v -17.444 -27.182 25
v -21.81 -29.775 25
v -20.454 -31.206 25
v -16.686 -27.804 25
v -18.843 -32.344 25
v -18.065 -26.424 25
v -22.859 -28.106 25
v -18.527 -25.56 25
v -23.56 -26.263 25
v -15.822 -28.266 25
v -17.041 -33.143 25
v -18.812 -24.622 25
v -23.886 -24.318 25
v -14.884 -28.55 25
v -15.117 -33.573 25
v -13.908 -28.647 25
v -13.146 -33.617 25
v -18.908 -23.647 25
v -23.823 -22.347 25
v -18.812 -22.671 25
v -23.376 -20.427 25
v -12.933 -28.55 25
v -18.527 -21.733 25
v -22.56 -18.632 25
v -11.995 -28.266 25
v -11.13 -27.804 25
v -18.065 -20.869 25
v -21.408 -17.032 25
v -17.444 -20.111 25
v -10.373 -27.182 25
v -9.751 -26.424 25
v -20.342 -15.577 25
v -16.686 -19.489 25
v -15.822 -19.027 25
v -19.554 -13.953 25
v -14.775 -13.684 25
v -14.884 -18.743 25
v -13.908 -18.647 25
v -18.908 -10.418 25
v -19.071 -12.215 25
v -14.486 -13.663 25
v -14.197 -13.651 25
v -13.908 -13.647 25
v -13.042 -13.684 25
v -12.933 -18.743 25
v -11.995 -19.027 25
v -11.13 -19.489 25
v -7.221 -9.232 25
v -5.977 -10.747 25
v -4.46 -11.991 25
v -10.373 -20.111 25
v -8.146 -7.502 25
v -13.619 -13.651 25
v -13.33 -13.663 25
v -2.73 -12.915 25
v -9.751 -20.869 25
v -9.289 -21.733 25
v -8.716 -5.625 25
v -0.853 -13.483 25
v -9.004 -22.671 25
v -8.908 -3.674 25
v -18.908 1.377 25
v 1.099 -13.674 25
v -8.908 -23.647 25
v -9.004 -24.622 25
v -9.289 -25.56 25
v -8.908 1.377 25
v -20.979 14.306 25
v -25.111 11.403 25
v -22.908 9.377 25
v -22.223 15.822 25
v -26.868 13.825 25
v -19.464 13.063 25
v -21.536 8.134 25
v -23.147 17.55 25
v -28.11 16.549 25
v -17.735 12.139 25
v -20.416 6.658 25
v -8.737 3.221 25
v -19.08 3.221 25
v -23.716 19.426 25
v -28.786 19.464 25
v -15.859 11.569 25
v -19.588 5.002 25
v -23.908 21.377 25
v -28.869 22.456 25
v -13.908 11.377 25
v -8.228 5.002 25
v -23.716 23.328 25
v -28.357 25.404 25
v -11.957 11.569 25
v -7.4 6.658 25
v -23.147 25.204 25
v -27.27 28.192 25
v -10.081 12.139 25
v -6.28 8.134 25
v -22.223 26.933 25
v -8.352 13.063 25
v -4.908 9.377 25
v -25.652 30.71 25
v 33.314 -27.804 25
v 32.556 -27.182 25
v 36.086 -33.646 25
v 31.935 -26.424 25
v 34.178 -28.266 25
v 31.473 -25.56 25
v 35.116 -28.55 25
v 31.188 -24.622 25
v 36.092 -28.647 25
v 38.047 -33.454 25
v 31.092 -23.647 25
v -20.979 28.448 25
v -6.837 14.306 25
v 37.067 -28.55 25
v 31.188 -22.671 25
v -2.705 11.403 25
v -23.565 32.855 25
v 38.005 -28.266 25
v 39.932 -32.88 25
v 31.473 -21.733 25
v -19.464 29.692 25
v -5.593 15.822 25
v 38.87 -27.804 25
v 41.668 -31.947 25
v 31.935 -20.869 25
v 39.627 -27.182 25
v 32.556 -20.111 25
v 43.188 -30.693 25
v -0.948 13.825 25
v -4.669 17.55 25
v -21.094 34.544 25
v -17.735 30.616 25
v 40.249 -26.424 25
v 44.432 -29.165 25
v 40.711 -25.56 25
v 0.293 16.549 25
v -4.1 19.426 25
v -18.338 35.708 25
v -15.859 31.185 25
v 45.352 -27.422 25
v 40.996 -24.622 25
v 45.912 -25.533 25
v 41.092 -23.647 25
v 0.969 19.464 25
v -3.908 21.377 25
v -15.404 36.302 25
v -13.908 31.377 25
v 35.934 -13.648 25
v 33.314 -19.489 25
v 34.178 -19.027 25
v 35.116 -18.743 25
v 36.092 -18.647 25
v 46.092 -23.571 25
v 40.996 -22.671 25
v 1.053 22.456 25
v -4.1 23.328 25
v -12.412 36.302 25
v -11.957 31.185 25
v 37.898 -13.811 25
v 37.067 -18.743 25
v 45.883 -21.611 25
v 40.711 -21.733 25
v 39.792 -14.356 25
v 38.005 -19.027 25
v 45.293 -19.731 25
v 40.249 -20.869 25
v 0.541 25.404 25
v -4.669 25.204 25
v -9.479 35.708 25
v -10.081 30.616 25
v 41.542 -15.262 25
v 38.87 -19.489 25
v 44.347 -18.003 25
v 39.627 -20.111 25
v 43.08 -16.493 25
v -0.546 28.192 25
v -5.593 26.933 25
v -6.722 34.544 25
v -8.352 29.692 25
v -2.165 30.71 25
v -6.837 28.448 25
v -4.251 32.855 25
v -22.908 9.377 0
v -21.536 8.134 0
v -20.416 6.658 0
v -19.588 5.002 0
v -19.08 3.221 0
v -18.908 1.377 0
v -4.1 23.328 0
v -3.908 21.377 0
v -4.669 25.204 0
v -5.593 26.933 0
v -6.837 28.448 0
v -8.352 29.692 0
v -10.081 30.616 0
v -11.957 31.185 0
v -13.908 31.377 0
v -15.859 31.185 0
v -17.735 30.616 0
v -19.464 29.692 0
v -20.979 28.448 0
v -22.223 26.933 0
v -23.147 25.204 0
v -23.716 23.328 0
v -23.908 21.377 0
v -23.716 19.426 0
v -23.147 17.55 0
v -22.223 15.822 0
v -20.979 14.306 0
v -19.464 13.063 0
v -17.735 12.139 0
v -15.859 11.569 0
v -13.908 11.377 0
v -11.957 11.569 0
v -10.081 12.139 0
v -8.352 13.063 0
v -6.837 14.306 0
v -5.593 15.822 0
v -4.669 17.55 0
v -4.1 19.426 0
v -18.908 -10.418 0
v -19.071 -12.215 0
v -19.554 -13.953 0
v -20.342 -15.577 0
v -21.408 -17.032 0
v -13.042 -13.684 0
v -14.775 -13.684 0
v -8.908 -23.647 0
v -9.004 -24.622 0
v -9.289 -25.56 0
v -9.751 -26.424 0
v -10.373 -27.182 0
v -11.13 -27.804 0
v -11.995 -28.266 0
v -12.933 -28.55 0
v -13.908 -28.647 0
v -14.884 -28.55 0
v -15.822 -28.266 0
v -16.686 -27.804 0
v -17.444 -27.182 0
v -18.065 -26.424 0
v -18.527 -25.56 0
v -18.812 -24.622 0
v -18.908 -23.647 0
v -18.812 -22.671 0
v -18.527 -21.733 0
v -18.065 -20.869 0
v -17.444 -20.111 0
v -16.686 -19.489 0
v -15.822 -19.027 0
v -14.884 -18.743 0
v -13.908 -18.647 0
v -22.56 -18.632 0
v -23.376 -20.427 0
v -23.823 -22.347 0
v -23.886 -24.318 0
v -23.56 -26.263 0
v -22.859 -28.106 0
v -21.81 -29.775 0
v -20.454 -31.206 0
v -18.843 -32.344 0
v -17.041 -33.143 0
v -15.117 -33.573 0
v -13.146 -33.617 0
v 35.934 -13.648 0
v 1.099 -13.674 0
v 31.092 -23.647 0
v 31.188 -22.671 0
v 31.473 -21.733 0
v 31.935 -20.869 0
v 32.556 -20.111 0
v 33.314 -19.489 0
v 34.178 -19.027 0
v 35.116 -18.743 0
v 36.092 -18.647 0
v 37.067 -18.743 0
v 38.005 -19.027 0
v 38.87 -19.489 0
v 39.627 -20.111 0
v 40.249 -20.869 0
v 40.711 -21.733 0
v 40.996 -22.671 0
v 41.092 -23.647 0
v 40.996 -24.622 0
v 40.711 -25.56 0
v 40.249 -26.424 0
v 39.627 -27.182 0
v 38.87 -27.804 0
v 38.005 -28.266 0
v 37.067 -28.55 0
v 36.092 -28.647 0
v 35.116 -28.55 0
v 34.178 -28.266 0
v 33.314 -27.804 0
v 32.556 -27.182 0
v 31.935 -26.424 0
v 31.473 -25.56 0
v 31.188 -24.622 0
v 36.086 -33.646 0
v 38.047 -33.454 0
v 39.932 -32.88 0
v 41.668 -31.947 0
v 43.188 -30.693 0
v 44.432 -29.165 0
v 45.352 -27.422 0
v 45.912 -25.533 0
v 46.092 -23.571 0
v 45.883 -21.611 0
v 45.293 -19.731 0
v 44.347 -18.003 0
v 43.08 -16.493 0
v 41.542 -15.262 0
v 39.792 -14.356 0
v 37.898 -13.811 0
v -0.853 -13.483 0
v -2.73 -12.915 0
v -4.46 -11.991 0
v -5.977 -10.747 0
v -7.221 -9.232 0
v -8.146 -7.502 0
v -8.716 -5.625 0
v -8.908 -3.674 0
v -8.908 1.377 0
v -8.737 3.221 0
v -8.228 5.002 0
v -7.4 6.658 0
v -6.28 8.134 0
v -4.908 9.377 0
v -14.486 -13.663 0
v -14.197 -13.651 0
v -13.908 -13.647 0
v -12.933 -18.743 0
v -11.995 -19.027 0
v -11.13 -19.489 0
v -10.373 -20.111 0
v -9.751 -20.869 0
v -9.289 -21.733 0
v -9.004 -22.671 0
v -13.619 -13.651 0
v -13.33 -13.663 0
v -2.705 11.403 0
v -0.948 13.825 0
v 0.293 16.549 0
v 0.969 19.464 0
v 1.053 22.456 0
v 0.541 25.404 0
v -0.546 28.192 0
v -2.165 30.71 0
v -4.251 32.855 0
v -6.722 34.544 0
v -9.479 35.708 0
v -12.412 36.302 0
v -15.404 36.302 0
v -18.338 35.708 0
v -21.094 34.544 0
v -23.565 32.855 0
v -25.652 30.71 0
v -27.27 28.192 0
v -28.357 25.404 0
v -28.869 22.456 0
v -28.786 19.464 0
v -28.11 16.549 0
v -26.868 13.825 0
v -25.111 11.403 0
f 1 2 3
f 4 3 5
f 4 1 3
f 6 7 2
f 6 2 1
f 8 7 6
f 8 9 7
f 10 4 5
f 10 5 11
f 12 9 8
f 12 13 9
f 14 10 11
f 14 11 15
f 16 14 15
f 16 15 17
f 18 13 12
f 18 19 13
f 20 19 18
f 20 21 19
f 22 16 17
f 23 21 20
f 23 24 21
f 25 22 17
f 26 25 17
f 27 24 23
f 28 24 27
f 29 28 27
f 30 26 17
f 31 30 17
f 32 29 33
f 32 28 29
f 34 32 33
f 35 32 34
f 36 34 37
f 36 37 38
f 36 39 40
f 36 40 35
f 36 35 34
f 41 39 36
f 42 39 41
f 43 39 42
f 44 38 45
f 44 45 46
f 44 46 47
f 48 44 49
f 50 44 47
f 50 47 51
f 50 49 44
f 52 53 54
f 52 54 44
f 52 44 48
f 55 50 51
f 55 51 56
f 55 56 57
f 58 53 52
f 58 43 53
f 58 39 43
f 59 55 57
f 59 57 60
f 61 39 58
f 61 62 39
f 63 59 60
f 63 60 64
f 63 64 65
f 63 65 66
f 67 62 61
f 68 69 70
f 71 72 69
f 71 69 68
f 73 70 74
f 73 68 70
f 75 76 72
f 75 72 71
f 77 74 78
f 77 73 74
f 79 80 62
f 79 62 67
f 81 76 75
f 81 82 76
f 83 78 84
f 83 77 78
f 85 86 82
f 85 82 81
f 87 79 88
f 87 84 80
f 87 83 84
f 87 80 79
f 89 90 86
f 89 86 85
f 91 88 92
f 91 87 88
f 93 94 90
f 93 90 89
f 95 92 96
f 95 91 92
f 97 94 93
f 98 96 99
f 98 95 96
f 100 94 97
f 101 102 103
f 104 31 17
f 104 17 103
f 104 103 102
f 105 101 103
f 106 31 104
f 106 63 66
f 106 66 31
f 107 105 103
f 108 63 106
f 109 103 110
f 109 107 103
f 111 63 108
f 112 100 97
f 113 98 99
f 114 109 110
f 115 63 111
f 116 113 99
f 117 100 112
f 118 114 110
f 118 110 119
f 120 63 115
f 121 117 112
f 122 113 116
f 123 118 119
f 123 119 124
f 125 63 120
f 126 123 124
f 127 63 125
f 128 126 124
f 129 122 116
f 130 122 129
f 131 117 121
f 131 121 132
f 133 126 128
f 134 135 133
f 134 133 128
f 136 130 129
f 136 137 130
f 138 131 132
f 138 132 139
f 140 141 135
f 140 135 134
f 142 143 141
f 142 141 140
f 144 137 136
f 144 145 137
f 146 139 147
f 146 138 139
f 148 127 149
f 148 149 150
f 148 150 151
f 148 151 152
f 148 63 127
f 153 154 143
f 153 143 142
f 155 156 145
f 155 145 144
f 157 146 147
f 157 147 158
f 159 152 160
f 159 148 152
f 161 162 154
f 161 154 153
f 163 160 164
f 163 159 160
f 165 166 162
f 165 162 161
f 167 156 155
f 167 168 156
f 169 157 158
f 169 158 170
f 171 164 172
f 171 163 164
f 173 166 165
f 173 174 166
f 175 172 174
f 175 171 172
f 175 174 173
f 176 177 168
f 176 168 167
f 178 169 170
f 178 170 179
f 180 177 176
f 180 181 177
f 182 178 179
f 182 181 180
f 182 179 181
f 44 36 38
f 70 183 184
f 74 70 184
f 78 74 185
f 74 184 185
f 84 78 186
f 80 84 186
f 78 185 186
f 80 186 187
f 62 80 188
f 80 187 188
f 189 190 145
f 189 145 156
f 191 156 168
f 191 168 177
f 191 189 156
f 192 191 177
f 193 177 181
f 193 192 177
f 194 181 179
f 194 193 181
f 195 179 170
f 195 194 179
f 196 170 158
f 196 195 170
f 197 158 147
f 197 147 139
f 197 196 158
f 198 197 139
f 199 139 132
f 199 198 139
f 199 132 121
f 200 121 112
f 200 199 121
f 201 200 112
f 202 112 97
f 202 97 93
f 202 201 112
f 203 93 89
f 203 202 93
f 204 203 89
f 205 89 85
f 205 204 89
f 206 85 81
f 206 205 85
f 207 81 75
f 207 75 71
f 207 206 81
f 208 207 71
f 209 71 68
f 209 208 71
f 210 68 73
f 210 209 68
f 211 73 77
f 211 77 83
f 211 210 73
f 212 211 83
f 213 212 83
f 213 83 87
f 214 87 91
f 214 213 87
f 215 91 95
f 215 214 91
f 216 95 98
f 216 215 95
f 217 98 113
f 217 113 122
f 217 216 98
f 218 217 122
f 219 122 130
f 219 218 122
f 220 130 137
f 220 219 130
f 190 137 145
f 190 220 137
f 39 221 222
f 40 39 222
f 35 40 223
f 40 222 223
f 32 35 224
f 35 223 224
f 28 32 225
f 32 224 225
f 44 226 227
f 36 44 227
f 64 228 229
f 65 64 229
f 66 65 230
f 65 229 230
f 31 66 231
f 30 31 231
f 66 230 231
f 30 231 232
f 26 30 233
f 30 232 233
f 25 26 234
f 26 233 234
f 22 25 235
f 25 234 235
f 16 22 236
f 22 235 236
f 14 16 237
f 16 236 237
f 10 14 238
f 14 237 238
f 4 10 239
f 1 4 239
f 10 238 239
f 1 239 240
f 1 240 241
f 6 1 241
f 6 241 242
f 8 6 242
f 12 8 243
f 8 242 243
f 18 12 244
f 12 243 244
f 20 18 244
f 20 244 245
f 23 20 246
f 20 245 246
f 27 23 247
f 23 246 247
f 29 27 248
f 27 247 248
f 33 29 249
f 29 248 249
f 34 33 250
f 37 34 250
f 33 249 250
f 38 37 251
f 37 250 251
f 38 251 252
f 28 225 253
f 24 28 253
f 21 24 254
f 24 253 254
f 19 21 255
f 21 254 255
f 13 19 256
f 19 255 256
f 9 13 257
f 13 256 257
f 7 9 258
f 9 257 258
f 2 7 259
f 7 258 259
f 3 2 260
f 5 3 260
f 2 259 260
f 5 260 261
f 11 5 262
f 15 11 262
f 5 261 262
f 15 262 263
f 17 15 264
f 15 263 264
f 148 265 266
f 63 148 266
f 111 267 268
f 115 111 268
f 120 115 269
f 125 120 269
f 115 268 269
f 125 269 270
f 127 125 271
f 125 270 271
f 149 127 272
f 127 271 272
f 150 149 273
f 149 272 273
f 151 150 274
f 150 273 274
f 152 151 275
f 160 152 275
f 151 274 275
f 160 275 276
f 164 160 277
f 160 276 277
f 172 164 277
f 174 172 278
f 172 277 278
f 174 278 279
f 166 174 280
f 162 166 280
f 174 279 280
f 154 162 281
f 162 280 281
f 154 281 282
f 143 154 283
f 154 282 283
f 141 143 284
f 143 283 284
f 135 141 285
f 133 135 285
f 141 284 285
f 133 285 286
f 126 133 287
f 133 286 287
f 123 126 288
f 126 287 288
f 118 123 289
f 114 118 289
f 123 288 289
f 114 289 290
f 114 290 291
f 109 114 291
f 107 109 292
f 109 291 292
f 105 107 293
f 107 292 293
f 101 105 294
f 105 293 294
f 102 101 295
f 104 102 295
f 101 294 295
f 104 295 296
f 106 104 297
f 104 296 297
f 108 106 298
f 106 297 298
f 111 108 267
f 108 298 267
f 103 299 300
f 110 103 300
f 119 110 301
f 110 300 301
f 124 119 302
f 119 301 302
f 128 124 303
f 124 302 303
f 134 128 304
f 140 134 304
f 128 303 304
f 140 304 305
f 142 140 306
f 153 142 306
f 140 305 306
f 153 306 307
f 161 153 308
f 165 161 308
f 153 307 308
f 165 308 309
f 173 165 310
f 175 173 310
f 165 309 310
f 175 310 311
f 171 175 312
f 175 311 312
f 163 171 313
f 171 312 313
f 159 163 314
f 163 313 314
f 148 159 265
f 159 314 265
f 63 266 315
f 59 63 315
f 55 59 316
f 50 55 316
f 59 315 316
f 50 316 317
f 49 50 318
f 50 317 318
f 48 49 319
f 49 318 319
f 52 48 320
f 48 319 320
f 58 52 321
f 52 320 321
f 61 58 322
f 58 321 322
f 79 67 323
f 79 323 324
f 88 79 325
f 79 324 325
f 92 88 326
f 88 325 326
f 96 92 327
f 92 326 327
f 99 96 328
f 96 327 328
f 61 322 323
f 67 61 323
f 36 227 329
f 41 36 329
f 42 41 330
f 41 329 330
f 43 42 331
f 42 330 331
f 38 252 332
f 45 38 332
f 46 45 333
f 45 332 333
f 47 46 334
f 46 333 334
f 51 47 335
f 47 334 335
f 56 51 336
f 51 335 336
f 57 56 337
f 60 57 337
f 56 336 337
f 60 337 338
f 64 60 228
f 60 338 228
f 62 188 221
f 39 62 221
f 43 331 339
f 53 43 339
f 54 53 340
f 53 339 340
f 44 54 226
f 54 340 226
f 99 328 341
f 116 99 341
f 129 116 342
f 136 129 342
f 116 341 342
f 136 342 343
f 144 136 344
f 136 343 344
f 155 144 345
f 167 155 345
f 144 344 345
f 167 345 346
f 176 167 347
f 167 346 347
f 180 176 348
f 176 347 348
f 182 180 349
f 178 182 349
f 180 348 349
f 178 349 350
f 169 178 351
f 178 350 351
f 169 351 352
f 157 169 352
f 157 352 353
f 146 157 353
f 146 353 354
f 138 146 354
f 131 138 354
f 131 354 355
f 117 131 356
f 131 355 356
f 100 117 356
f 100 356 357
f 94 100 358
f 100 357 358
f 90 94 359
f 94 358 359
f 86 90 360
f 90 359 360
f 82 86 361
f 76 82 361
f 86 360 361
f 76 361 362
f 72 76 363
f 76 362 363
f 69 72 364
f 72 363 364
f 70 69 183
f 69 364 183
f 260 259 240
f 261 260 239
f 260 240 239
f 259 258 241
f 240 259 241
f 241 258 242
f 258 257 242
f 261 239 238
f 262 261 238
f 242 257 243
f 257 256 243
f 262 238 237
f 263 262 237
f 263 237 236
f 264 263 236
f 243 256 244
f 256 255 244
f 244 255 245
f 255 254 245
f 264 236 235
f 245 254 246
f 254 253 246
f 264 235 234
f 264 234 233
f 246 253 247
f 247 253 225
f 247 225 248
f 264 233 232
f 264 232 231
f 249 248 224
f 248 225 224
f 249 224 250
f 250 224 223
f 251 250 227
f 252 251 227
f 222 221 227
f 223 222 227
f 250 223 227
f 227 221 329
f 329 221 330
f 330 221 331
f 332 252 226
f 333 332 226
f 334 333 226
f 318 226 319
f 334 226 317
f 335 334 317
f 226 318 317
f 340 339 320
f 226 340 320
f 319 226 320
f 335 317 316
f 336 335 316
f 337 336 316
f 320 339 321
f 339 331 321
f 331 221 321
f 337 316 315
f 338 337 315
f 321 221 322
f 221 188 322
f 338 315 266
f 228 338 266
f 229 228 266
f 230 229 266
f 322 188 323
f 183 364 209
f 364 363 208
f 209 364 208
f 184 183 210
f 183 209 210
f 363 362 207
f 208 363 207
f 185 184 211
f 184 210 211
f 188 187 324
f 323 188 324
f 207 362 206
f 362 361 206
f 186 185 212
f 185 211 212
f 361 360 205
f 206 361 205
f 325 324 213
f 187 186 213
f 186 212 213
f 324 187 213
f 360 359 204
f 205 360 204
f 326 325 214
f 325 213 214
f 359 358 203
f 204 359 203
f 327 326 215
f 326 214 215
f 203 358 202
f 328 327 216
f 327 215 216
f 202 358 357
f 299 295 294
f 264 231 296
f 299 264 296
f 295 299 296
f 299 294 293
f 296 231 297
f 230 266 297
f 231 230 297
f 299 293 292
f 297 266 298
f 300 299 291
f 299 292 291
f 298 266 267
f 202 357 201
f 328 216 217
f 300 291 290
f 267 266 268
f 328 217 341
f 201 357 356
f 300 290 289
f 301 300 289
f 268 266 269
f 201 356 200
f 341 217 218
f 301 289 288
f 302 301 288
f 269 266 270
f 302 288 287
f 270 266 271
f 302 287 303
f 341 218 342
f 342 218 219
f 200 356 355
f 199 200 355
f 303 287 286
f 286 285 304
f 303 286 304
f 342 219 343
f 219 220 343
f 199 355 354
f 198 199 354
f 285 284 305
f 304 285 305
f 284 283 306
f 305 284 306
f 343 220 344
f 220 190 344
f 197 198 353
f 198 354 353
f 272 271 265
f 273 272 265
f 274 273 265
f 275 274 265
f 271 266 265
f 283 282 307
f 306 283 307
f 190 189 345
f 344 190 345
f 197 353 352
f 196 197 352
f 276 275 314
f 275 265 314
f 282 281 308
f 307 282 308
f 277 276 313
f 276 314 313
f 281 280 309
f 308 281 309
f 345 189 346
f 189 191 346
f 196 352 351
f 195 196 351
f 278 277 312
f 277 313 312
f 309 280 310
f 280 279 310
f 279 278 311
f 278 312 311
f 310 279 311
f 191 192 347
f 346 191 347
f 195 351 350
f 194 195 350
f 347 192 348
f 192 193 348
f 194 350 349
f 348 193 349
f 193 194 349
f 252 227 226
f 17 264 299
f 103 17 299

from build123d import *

# Parameters (mm, degrees)
F0_R     = 10
F1_DEPTH = 25


with BuildPart() as f1:
    # F0 (on Top) → F1 (new body)
    with BuildSketch(Plane.XY):
        with BuildLine():
            ThreePointArc((41.091912, -23.646501), (36.091912, -18.646501), (31.091912, -23.646501))
            ThreePointArc((31.091912, -23.646501), (36.091912, -28.646501), (41.091912, -23.646501))
        make_face()
        with BuildLine():
            ThreePointArc((-8.908088, 1.377323), (-7.85236, 5.849459), (-4.908088, 9.377323))
            ThreePointArc((-4.908088, 9.377323), (-13.908088, 36.377323), (-22.908088, 9.377323))
            ThreePointArc((-22.908088, 9.377323), (-19.963816, 5.849459), (-18.908088, 1.377323))
            Line((-18.908088, 1.377323), (-18.908088, -10.417745))
            ThreePointArc((-18.908088, -10.417745), (-19.553944, -13.953278), (-21.408088, -17.032123))
            ThreePointArc((-21.408088, -17.032123), (-22.858864, -28.105605), (-13.145628, -33.617392))
            Line((-13.145628, -33.617392), (36.086, -33.646499))
            ThreePointArc((36.086, -33.646499), (46.091625, -23.57069), (35.934383, -13.647742))
            Line((35.934383, -13.647742), (1.099337, -13.673606))
            ThreePointArc((1.099337, -13.673606), (-5.97653, -10.747301), (-8.908088, -3.673609))
            Line((-8.908088, -3.673609), (-8.908088, 1.377323))
        make_face()
        with BuildLine():
            ThreePointArc((-8.908088, -23.646501), (-17.443622, -27.182035), (-13.908088, -18.646501))
            ThreePointArc((-13.908088, -18.646501), (-10.372554, -20.110967), (-8.908088, -23.646501))
        make_face(mode=Mode.SUBTRACT)
        with BuildLine():
            ThreePointArc((-13.908088, -13.646501), (-13.474473, -13.655907), (-13.041674, -13.684105))
            Line((-13.041674, -13.684105), (-13.908088, -13.684105))
            Line((-13.908088, -13.684105), (-14.774502, -13.684105))
            ThreePointArc((-14.774502, -13.684105), (-14.341703, -13.655907), (-13.908088, -13.646501))
        make_face(mode=Mode.SUBTRACT)
        with BuildLine():
            ThreePointArc((41.091912, -23.646501), (36.091912, -28.646501), (31.091912, -23.646501))
            ThreePointArc((31.091912, -23.646501), (36.091912, -18.646501), (41.091912, -23.646501))
        make_face(mode=Mode.SUBTRACT)
        with Locations((-13.908088, 21.377323)):
            Circle(F0_R, mode=Mode.SUBTRACT)
    extrude(amount=F1_DEPTH)


solid = f1.part
